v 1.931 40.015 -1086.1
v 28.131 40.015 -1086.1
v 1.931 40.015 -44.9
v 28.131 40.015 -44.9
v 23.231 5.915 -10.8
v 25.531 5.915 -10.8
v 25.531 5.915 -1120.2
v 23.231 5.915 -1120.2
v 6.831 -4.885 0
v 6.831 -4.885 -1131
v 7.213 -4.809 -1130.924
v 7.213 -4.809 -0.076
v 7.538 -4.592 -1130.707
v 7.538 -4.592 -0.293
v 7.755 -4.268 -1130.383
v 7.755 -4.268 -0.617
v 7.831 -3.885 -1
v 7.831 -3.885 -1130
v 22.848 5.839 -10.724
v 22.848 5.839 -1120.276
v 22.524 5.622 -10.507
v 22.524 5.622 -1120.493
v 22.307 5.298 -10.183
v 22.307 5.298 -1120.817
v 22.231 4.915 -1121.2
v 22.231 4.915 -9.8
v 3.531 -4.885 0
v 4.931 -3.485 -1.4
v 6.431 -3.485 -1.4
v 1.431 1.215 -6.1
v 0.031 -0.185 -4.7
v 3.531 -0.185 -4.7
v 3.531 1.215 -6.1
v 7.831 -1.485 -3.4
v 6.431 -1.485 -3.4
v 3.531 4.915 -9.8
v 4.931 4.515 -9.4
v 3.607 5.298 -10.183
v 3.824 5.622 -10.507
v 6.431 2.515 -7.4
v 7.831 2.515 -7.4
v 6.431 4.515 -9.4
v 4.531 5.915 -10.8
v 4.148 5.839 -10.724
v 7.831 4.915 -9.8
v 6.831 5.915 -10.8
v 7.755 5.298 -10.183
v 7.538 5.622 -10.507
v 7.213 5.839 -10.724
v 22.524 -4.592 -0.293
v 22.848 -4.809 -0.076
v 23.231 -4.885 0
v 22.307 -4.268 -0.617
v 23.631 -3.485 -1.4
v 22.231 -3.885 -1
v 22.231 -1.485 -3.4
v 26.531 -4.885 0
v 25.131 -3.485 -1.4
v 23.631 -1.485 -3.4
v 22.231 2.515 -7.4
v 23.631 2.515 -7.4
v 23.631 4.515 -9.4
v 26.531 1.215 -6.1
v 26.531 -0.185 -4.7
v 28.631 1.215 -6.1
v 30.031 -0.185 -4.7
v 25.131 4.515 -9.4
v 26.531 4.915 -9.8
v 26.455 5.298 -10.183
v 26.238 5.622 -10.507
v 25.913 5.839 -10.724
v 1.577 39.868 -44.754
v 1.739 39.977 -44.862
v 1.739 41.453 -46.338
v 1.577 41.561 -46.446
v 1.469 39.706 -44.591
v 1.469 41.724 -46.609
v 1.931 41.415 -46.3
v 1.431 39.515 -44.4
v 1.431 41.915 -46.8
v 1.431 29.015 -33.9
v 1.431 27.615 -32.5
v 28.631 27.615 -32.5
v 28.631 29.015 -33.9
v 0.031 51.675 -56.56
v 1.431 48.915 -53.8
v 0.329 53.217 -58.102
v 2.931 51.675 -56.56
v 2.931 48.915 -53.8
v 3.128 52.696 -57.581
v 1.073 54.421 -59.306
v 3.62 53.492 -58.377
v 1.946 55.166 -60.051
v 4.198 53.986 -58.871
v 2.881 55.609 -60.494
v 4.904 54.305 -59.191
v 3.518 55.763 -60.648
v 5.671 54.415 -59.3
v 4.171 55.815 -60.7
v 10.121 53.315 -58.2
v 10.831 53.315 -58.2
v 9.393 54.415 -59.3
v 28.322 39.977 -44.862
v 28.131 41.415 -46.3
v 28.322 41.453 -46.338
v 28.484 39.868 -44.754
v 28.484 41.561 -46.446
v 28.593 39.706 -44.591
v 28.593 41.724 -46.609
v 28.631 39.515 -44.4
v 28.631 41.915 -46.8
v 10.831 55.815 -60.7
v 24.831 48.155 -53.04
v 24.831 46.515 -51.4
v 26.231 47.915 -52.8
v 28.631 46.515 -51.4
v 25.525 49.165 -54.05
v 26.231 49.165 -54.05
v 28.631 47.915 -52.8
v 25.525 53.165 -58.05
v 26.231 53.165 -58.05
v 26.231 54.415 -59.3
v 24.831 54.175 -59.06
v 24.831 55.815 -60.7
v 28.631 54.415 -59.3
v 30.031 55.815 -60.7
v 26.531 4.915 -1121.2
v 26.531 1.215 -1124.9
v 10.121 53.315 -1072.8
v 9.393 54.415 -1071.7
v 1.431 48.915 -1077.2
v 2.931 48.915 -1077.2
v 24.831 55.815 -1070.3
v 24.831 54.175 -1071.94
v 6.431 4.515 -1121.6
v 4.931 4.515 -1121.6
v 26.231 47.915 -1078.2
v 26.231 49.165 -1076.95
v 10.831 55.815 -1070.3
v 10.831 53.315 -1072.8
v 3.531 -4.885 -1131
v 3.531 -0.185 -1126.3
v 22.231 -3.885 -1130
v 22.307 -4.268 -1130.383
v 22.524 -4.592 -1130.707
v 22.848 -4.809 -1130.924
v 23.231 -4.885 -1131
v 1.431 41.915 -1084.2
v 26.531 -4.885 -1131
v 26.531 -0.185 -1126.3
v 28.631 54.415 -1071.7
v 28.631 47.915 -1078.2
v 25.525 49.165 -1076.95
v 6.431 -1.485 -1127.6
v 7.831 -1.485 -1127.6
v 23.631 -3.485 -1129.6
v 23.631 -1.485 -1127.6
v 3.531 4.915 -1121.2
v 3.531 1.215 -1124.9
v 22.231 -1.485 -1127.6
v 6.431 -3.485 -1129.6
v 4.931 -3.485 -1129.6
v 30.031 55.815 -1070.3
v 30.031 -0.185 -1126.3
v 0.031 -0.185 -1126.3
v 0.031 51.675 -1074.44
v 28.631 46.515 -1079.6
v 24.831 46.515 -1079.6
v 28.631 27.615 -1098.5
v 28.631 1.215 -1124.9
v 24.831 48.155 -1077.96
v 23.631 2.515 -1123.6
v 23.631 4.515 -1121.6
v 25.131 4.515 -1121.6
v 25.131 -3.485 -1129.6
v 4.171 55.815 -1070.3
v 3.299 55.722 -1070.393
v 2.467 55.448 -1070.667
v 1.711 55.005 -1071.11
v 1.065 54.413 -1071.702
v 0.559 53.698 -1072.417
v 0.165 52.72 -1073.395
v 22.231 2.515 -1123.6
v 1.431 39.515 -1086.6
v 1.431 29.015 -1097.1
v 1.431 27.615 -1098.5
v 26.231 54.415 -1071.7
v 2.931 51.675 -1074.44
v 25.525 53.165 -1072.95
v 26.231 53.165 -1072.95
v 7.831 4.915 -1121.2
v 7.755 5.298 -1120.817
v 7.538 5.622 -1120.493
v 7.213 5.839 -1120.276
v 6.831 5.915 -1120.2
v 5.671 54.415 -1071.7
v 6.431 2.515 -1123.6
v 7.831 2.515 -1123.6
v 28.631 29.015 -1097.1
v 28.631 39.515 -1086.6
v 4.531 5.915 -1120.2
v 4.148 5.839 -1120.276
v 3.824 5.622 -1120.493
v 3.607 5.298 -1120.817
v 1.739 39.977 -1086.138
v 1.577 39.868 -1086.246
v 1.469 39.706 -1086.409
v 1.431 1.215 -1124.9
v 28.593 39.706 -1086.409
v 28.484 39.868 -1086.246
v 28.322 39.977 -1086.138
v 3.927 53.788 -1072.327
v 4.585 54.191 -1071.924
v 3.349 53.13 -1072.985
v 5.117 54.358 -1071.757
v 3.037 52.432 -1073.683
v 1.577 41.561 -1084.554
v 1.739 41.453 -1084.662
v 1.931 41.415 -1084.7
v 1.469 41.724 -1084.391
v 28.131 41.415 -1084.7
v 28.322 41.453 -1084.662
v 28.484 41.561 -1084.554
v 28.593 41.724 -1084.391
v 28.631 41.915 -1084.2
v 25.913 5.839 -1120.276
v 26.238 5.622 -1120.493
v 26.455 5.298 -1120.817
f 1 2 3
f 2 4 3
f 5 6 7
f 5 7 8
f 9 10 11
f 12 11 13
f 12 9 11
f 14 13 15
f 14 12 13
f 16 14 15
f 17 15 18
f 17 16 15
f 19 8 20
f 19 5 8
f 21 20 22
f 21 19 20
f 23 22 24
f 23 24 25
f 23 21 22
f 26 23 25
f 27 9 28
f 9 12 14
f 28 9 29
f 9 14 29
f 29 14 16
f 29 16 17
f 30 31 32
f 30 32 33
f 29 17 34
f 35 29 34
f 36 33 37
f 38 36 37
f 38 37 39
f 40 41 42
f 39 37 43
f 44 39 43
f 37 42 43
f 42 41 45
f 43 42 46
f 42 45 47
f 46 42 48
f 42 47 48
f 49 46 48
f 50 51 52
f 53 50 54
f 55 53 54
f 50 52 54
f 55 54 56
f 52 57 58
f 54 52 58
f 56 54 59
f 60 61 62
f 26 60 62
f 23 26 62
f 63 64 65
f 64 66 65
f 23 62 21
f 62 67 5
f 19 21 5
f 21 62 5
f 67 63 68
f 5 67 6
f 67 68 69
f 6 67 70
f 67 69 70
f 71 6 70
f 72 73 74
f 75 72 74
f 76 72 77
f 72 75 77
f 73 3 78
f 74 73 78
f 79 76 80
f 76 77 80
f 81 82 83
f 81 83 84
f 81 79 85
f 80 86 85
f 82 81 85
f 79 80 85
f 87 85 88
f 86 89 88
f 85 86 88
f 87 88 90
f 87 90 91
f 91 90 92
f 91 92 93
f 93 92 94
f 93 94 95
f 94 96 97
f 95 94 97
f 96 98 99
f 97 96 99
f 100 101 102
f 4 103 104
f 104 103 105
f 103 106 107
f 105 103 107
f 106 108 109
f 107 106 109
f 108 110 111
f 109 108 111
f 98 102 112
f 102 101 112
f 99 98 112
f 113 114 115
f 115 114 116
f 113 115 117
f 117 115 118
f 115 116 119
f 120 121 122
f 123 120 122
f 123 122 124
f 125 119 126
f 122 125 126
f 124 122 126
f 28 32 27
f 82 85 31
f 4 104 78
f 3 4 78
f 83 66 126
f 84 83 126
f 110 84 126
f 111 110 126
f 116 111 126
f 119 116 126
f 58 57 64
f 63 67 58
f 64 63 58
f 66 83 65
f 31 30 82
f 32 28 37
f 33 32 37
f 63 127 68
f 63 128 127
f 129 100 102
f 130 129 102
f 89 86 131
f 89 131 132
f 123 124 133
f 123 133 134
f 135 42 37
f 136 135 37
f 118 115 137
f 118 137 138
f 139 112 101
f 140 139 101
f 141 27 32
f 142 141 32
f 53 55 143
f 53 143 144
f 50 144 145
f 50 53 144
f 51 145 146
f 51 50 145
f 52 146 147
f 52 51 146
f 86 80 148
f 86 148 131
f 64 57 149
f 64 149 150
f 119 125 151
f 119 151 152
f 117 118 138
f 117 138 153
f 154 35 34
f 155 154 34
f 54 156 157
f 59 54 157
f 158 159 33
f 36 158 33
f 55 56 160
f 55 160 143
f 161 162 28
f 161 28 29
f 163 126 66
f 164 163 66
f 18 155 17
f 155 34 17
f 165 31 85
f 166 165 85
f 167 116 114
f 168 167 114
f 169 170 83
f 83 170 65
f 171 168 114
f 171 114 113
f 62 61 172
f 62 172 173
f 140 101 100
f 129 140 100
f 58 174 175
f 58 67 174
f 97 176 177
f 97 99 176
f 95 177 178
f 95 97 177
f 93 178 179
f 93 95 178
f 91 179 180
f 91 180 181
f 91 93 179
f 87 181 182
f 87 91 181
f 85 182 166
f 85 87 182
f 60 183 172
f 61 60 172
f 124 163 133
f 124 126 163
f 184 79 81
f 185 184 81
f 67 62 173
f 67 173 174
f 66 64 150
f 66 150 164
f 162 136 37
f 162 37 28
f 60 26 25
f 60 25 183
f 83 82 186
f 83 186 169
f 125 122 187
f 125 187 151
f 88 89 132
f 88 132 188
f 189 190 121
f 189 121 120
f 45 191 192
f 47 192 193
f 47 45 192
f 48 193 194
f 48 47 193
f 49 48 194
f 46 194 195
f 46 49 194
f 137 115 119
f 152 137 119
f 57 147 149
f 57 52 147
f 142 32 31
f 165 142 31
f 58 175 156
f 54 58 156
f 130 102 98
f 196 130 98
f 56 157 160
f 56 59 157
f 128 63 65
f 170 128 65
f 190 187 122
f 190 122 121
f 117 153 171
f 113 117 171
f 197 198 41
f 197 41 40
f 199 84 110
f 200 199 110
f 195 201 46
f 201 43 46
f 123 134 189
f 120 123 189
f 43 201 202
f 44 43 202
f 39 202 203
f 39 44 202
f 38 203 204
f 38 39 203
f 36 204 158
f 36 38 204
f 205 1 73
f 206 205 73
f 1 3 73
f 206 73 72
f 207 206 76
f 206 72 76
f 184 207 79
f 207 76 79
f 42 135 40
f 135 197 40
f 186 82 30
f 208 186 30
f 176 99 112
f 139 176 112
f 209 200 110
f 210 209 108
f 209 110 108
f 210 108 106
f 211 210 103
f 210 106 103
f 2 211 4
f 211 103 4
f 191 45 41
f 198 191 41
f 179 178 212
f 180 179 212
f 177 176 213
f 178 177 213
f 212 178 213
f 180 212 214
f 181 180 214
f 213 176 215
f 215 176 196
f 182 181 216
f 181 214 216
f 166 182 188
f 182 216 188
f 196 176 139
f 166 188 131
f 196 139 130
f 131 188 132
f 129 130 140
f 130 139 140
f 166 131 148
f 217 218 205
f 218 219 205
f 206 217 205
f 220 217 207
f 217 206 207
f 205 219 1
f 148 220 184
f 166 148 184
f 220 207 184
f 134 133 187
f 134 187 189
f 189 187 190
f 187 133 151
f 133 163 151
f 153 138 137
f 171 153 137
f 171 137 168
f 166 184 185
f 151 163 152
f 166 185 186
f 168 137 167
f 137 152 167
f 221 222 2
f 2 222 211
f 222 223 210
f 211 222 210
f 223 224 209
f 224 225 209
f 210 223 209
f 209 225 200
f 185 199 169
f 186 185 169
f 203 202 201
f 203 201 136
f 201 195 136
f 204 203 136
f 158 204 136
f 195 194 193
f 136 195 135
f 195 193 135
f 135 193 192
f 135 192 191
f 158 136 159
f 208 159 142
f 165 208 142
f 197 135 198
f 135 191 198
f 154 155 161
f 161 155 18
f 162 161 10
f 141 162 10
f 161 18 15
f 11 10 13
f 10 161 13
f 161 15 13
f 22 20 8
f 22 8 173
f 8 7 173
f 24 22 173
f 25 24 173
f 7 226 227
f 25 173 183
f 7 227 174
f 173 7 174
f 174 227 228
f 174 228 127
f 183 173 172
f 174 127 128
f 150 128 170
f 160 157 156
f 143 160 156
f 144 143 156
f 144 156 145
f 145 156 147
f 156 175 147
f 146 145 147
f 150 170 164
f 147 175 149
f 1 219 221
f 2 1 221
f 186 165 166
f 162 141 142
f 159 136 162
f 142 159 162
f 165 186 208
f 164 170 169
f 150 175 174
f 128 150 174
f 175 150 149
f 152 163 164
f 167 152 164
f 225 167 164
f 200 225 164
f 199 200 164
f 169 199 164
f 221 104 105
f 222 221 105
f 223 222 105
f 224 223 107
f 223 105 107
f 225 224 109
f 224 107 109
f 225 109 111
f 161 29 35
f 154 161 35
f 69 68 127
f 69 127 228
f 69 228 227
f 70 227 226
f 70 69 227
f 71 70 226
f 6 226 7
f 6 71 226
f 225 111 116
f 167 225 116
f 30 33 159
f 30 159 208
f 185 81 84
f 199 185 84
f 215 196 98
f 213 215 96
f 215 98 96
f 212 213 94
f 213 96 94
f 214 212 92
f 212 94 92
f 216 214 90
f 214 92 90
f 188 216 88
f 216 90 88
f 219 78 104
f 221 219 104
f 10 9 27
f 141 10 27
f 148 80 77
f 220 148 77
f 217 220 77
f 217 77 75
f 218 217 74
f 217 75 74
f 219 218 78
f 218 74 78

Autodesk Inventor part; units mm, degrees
ref_plane "YZ Plane" through (0, 0, 0) normal (1, 0, 0) x (0, 1, 0)
ref_plane "XZ Plane" through (0, 0, 0) normal (0, 1, 0) x (-1, 0, 0)
sketch "Boceto1" plane through (0, 0, 0) normal (0, 0, 1) x (1, 0, 0)
  line L0 (28.1307, 40.0149) -> (1.9307, 40.0149)
  line L1 (1.9307, 41.4149) -> (28.1307, 41.4149)
  line L2 (0.0307, -0.1851) -> (0.0307, 51.6749)
  line L3 (24.8307, 55.8149) -> (24.8307, 54.1749)
  line L4 (28.6307, 54.4149) -> (28.6307, 47.9149)
  line L5 (28.6307, 46.5149) -> (24.8307, 46.5149)
  line L6 (24.8307, 46.5149) -> (24.8307, 48.1549)
  line L7 (26.2307, 47.9149) -> (28.6307, 47.9149)
  line L8 (26.2307, 49.1649) -> (25.5249, 49.1649)
  line L9 (25.5249, 49.1649) -> (24.8307, 48.1549)
  line L10 (26.2307, 53.1649) -> (25.5249, 53.1649)
  line L11 (1.4307, 41.9149) -> (1.4307, 48.9149)
  line L12 (1.4307, 48.9149) -> (2.9307, 48.9149)
  line L13 (2.9307, 48.9149) -> (2.9307, 51.6749)
  line L14 (4.1707, 55.8149) -> (10.8307, 55.8149)
  line L15 (9.3926, 54.4149) -> (5.6707, 54.4149)
  line L16 (10.8307, 55.8149) -> (10.8307, 53.3149)
  line L17 (10.8307, 53.3149) -> (10.1207, 53.3149)
  line L18 (10.1207, 53.3149) -> (9.3926, 54.4149)
  line L19 (26.2307, 54.4149) -> (28.6307, 54.4149)
  arc A0 (5.6707, 54.4149) -> (2.9307, 51.6749) centre (5.6707, 51.6749) ccw
  arc A1 (4.1707, 55.8149) -> (0.0307, 51.6749) centre (4.1707, 51.6749) ccw
  line L20 (24.8307, 54.1749) -> (25.5249, 53.1649)
  line L21 (26.2307, 54.4149) -> (26.2307, 53.1649)
  line L22 (26.2307, 47.9149) -> (26.2307, 49.1649)
  arc A2 (1.9307, 40.0149) -> (1.4307, 39.5149) centre (1.9307, 39.5149) ccw
  arc A3 (28.6307, 39.5149) -> (28.1307, 40.0149) centre (28.1307, 39.5149) ccw
  arc A4 (28.1307, 41.4149) -> (28.6307, 41.9149) centre (28.1307, 41.9149) ccw
  arc A5 (1.4307, 41.9149) -> (1.9307, 41.4149) centre (1.9307, 41.9149) ccw
  line L23 (30.0307, 55.8149) -> (24.8307, 55.8149)
  line L24 (28.6307, 41.9149) -> (28.6307, 46.5149)
  line L25 (30.0307, 55.8149) -> (30.0307, -0.1851)
  line L26 (1.4307, 29.0149) -> (28.6307, 29.0149)
  line L27 (1.4307, 27.6149) -> (28.6307, 27.6149)
  line L28 (1.4307, 39.5149) -> (1.4307, 29.0149)
  line L29 (1.4307, 27.6149) -> (1.4307, 1.2149)
  line L30 (28.6307, 1.2149) -> (28.6307, 27.6149)
  line L31 (28.6307, 29.0149) -> (28.6307, 39.5149)
  line L32 (28.6307, 39.5149) -> (28.6307, 29.0149)
  line L33 (28.6307, 27.6149) -> (28.6307, 1.2149)
  line L34 (4.5307, 5.9149) -> (6.8307, 5.9149)
  line L35 (7.8307, 4.9149) -> (7.8307, 2.5149)
  line L36 (7.8307, 2.5149) -> (6.4307, 2.5149)
  line L37 (6.4307, 2.5149) -> (6.4307, 4.5149)
  line L38 (6.4307, 4.5149) -> (4.9307, 4.5149)
  line L39 (4.9307, 4.5149) -> (4.9307, -3.4851)
  line L40 (4.9307, -3.4851) -> (6.4307, -3.4851)
  line L41 (6.4307, -3.4851) -> (6.4307, -1.4851)
  line L42 (6.4307, -1.4851) -> (7.8307, -1.4851)
  line L43 (7.8307, -1.4851) -> (7.8307, -3.8851)
  line L44 (6.8307, -4.8851) -> (3.5307, -4.8851)
  line L45 (3.5307, -4.8851) -> (3.5307, -0.1851)
  arc A6 (7.8307, 4.9149) -> (6.8307, 5.9149) centre (6.8307, 4.9149) ccw
  arc A7 (4.5307, 5.9149) -> (3.5307, 4.9149) centre (4.5307, 4.9149) ccw
  arc A8 (6.8307, -4.8851) -> (7.8307, -3.8851) centre (6.8307, -3.8851) ccw
  line L46 (3.5307, 1.2149) -> (1.4307, 1.2149)
  line L47 (3.5307, -0.1851) -> (0.0307, -0.1851)
  line L48 (3.5307, 1.2149) -> (3.5307, 4.9149)
  line L49 (25.5307, 5.9149) -> (23.2307, 5.9149)
  line L50 (22.2307, 4.9149) -> (22.2307, 2.5149)
  line L51 (22.2307, 2.5149) -> (23.6307, 2.5149)
  line L52 (23.6307, 2.5149) -> (23.6307, 4.5149)
  line L53 (23.6307, 4.5149) -> (25.1307, 4.5149)
  line L54 (25.1307, 4.5149) -> (25.1307, -3.4851)
  line L55 (25.1307, -3.4851) -> (23.6307, -3.4851)
  line L56 (23.6307, -3.4851) -> (23.6307, -1.4851)
  line L57 (23.6307, -1.4851) -> (22.2307, -1.4851)
  line L58 (22.2307, -1.4851) -> (22.2307, -3.8851)
  line L59 (23.2307, -4.8851) -> (26.5307, -4.8851)
  line L60 (26.5307, -4.8851) -> (26.5307, -0.1851)
  arc A9 (23.2307, 5.9149) -> (22.2307, 4.9149) centre (23.2307, 4.9149) ccw
  arc A10 (26.5307, 4.9149) -> (25.5307, 5.9149) centre (25.5307, 4.9149) ccw
  arc A11 (22.2307, -3.8851) -> (23.2307, -4.8851) centre (23.2307, -3.8851) ccw
  line L61 (26.5307, 1.2149) -> (28.6307, 1.2149)
  line L62 (26.5307, -0.1851) -> (30.0307, -0.1851)
  line L63 (26.5307, 1.2149) -> (26.5307, 4.9149)
  point P0 (28.6307, 51.1649)
  point P1 (0.0307, 0.7149)
  point P2 (4.9307, 0.5149)
  point P3 (25.1307, 0.5149)
  dimension "d31" = 1.4
  dimension "d42" = 2.5
  dimension "d43" = 0.71
  dimension "d45" = 2.9
  dimension "d47" = 33.5
  dimension "d48" = 7.5
  dimension "d51" = 2.74
  dimension "d59" = 6.9
  dimension "d60" = 1.4
  dimension "d78" = 6.5
  dimension "d84" = 1.4
  dimension "d85" = 1.4
  dimension "d88" = 2.4
  dimension "d95" = 6.02
  dimension "d99" = 111
  dimension "d100" = 2.4
  dimension "d108" = 4
  dimension "d109" = 0.7058
  dimension "d110" = 0.7058
  dimension "d143" = 1.4
  dimension "d147" = 1.4
  dimension "d148" = 30
  dimension "d149" = 1.4
  dimension "d150" = 14
  dimension "d151" = 27.2
  dimension "d152" = 14.4
  dimension "d153" = 1.4
  dimension "d154" = 11
  dimension "d155" = 1.4
  dimension "d156" = 1.4
  dimension "d157" = 1.4
  dimension "d158" = 1.4
  dimension "d162" = 60.7
  dimension "d163" = 10.8
  dimension "d164" = 8
  dimension "d165" = 2
  dimension "d166" = 4
  dimension "d167" = 1.5
  dimension "d168" = 7.8
  dimension "d169" = 1
  dimension "d172" = 1.4
  dimension "d173" = 4.7
  dimension "d175" = 56
  dimension "d176" = 13.8
  dimension "d177" = 14.4
  dimension "d180" = 1.5
  dimension "d181" = 4.14
  dimension "d182" = 10.8
  dimension "d183" = 14.4
  dimension "d184" = 0.5
  dimension "d187" = 3.5
  dimension "d188" = 4.9
  dimension "d189" = 6.4
  dimension "d190" = 7.8
  dimension "d191" = 26.5
  dimension "d193" = 54.6
  dimension "d195" = 3.5
  dimension "d196" = 4.9
  dimension "d197" = 53.9
  dimension "d198" = 53.7
  dimension "d202" = 2
  dimension "d203" = 3.01
  dimension "d204" = 2
  dimension "d205" = 9.3
extrude "Extrusión1" add sketch "Boceto1" against normal blind 1131
ref_plane "Plano de trabajo1" through (0, 0, -565.5) normal (0, 0, 1) x (1, 0, 0)
sketch "Boceto2" plane through (30.0307, -0.1851, 0) normal (1, 0, 0) x (0, 0, -1)
  line L0 (0, -4.7) -> (0, 0) projected
  line L1 (0, -4.7) -> (1131, -4.7) projected
  line L2 (1131, 0) -> (1131, -4.7) projected
  line L3 (0, 0) -> (1131, 0) projected
  line L4 (0, 0) -> (0, 56) projected
  line L5 (0, 0) -> (1131, 0) projected
  line L6 (1131, 56) -> (1131, 0) projected
  line L7 (0, 56) -> (1131, 56) projected
  line L8 (0, -4.7) -> (60.7, 56)
  line L9 (0, 56) -> (60.7, 56)
  line L10 (0, 56) -> (0, -4.7)
  point P0 (0, 0.1851)
  point P1 (0, 0)
  dimension "d201" = 45
extrude "Extrusión2" cut sketch "Boceto2" against normal through all contours L0 L3 L8 | L4 L7 L8 L3
mirror "Simetría1" about plane through (0, 0, -565.5) normal (0, 0, 1) of "Extrusión2"
ref_plane "Plano de trabajo2" through (15.0307, -0.1851, -1126.3) normal (-1, 0, 0) x (0, 0, 1)
properties part number "SP40-10 HOJA CORREDERA 1131 mm" material "Aluminio"
